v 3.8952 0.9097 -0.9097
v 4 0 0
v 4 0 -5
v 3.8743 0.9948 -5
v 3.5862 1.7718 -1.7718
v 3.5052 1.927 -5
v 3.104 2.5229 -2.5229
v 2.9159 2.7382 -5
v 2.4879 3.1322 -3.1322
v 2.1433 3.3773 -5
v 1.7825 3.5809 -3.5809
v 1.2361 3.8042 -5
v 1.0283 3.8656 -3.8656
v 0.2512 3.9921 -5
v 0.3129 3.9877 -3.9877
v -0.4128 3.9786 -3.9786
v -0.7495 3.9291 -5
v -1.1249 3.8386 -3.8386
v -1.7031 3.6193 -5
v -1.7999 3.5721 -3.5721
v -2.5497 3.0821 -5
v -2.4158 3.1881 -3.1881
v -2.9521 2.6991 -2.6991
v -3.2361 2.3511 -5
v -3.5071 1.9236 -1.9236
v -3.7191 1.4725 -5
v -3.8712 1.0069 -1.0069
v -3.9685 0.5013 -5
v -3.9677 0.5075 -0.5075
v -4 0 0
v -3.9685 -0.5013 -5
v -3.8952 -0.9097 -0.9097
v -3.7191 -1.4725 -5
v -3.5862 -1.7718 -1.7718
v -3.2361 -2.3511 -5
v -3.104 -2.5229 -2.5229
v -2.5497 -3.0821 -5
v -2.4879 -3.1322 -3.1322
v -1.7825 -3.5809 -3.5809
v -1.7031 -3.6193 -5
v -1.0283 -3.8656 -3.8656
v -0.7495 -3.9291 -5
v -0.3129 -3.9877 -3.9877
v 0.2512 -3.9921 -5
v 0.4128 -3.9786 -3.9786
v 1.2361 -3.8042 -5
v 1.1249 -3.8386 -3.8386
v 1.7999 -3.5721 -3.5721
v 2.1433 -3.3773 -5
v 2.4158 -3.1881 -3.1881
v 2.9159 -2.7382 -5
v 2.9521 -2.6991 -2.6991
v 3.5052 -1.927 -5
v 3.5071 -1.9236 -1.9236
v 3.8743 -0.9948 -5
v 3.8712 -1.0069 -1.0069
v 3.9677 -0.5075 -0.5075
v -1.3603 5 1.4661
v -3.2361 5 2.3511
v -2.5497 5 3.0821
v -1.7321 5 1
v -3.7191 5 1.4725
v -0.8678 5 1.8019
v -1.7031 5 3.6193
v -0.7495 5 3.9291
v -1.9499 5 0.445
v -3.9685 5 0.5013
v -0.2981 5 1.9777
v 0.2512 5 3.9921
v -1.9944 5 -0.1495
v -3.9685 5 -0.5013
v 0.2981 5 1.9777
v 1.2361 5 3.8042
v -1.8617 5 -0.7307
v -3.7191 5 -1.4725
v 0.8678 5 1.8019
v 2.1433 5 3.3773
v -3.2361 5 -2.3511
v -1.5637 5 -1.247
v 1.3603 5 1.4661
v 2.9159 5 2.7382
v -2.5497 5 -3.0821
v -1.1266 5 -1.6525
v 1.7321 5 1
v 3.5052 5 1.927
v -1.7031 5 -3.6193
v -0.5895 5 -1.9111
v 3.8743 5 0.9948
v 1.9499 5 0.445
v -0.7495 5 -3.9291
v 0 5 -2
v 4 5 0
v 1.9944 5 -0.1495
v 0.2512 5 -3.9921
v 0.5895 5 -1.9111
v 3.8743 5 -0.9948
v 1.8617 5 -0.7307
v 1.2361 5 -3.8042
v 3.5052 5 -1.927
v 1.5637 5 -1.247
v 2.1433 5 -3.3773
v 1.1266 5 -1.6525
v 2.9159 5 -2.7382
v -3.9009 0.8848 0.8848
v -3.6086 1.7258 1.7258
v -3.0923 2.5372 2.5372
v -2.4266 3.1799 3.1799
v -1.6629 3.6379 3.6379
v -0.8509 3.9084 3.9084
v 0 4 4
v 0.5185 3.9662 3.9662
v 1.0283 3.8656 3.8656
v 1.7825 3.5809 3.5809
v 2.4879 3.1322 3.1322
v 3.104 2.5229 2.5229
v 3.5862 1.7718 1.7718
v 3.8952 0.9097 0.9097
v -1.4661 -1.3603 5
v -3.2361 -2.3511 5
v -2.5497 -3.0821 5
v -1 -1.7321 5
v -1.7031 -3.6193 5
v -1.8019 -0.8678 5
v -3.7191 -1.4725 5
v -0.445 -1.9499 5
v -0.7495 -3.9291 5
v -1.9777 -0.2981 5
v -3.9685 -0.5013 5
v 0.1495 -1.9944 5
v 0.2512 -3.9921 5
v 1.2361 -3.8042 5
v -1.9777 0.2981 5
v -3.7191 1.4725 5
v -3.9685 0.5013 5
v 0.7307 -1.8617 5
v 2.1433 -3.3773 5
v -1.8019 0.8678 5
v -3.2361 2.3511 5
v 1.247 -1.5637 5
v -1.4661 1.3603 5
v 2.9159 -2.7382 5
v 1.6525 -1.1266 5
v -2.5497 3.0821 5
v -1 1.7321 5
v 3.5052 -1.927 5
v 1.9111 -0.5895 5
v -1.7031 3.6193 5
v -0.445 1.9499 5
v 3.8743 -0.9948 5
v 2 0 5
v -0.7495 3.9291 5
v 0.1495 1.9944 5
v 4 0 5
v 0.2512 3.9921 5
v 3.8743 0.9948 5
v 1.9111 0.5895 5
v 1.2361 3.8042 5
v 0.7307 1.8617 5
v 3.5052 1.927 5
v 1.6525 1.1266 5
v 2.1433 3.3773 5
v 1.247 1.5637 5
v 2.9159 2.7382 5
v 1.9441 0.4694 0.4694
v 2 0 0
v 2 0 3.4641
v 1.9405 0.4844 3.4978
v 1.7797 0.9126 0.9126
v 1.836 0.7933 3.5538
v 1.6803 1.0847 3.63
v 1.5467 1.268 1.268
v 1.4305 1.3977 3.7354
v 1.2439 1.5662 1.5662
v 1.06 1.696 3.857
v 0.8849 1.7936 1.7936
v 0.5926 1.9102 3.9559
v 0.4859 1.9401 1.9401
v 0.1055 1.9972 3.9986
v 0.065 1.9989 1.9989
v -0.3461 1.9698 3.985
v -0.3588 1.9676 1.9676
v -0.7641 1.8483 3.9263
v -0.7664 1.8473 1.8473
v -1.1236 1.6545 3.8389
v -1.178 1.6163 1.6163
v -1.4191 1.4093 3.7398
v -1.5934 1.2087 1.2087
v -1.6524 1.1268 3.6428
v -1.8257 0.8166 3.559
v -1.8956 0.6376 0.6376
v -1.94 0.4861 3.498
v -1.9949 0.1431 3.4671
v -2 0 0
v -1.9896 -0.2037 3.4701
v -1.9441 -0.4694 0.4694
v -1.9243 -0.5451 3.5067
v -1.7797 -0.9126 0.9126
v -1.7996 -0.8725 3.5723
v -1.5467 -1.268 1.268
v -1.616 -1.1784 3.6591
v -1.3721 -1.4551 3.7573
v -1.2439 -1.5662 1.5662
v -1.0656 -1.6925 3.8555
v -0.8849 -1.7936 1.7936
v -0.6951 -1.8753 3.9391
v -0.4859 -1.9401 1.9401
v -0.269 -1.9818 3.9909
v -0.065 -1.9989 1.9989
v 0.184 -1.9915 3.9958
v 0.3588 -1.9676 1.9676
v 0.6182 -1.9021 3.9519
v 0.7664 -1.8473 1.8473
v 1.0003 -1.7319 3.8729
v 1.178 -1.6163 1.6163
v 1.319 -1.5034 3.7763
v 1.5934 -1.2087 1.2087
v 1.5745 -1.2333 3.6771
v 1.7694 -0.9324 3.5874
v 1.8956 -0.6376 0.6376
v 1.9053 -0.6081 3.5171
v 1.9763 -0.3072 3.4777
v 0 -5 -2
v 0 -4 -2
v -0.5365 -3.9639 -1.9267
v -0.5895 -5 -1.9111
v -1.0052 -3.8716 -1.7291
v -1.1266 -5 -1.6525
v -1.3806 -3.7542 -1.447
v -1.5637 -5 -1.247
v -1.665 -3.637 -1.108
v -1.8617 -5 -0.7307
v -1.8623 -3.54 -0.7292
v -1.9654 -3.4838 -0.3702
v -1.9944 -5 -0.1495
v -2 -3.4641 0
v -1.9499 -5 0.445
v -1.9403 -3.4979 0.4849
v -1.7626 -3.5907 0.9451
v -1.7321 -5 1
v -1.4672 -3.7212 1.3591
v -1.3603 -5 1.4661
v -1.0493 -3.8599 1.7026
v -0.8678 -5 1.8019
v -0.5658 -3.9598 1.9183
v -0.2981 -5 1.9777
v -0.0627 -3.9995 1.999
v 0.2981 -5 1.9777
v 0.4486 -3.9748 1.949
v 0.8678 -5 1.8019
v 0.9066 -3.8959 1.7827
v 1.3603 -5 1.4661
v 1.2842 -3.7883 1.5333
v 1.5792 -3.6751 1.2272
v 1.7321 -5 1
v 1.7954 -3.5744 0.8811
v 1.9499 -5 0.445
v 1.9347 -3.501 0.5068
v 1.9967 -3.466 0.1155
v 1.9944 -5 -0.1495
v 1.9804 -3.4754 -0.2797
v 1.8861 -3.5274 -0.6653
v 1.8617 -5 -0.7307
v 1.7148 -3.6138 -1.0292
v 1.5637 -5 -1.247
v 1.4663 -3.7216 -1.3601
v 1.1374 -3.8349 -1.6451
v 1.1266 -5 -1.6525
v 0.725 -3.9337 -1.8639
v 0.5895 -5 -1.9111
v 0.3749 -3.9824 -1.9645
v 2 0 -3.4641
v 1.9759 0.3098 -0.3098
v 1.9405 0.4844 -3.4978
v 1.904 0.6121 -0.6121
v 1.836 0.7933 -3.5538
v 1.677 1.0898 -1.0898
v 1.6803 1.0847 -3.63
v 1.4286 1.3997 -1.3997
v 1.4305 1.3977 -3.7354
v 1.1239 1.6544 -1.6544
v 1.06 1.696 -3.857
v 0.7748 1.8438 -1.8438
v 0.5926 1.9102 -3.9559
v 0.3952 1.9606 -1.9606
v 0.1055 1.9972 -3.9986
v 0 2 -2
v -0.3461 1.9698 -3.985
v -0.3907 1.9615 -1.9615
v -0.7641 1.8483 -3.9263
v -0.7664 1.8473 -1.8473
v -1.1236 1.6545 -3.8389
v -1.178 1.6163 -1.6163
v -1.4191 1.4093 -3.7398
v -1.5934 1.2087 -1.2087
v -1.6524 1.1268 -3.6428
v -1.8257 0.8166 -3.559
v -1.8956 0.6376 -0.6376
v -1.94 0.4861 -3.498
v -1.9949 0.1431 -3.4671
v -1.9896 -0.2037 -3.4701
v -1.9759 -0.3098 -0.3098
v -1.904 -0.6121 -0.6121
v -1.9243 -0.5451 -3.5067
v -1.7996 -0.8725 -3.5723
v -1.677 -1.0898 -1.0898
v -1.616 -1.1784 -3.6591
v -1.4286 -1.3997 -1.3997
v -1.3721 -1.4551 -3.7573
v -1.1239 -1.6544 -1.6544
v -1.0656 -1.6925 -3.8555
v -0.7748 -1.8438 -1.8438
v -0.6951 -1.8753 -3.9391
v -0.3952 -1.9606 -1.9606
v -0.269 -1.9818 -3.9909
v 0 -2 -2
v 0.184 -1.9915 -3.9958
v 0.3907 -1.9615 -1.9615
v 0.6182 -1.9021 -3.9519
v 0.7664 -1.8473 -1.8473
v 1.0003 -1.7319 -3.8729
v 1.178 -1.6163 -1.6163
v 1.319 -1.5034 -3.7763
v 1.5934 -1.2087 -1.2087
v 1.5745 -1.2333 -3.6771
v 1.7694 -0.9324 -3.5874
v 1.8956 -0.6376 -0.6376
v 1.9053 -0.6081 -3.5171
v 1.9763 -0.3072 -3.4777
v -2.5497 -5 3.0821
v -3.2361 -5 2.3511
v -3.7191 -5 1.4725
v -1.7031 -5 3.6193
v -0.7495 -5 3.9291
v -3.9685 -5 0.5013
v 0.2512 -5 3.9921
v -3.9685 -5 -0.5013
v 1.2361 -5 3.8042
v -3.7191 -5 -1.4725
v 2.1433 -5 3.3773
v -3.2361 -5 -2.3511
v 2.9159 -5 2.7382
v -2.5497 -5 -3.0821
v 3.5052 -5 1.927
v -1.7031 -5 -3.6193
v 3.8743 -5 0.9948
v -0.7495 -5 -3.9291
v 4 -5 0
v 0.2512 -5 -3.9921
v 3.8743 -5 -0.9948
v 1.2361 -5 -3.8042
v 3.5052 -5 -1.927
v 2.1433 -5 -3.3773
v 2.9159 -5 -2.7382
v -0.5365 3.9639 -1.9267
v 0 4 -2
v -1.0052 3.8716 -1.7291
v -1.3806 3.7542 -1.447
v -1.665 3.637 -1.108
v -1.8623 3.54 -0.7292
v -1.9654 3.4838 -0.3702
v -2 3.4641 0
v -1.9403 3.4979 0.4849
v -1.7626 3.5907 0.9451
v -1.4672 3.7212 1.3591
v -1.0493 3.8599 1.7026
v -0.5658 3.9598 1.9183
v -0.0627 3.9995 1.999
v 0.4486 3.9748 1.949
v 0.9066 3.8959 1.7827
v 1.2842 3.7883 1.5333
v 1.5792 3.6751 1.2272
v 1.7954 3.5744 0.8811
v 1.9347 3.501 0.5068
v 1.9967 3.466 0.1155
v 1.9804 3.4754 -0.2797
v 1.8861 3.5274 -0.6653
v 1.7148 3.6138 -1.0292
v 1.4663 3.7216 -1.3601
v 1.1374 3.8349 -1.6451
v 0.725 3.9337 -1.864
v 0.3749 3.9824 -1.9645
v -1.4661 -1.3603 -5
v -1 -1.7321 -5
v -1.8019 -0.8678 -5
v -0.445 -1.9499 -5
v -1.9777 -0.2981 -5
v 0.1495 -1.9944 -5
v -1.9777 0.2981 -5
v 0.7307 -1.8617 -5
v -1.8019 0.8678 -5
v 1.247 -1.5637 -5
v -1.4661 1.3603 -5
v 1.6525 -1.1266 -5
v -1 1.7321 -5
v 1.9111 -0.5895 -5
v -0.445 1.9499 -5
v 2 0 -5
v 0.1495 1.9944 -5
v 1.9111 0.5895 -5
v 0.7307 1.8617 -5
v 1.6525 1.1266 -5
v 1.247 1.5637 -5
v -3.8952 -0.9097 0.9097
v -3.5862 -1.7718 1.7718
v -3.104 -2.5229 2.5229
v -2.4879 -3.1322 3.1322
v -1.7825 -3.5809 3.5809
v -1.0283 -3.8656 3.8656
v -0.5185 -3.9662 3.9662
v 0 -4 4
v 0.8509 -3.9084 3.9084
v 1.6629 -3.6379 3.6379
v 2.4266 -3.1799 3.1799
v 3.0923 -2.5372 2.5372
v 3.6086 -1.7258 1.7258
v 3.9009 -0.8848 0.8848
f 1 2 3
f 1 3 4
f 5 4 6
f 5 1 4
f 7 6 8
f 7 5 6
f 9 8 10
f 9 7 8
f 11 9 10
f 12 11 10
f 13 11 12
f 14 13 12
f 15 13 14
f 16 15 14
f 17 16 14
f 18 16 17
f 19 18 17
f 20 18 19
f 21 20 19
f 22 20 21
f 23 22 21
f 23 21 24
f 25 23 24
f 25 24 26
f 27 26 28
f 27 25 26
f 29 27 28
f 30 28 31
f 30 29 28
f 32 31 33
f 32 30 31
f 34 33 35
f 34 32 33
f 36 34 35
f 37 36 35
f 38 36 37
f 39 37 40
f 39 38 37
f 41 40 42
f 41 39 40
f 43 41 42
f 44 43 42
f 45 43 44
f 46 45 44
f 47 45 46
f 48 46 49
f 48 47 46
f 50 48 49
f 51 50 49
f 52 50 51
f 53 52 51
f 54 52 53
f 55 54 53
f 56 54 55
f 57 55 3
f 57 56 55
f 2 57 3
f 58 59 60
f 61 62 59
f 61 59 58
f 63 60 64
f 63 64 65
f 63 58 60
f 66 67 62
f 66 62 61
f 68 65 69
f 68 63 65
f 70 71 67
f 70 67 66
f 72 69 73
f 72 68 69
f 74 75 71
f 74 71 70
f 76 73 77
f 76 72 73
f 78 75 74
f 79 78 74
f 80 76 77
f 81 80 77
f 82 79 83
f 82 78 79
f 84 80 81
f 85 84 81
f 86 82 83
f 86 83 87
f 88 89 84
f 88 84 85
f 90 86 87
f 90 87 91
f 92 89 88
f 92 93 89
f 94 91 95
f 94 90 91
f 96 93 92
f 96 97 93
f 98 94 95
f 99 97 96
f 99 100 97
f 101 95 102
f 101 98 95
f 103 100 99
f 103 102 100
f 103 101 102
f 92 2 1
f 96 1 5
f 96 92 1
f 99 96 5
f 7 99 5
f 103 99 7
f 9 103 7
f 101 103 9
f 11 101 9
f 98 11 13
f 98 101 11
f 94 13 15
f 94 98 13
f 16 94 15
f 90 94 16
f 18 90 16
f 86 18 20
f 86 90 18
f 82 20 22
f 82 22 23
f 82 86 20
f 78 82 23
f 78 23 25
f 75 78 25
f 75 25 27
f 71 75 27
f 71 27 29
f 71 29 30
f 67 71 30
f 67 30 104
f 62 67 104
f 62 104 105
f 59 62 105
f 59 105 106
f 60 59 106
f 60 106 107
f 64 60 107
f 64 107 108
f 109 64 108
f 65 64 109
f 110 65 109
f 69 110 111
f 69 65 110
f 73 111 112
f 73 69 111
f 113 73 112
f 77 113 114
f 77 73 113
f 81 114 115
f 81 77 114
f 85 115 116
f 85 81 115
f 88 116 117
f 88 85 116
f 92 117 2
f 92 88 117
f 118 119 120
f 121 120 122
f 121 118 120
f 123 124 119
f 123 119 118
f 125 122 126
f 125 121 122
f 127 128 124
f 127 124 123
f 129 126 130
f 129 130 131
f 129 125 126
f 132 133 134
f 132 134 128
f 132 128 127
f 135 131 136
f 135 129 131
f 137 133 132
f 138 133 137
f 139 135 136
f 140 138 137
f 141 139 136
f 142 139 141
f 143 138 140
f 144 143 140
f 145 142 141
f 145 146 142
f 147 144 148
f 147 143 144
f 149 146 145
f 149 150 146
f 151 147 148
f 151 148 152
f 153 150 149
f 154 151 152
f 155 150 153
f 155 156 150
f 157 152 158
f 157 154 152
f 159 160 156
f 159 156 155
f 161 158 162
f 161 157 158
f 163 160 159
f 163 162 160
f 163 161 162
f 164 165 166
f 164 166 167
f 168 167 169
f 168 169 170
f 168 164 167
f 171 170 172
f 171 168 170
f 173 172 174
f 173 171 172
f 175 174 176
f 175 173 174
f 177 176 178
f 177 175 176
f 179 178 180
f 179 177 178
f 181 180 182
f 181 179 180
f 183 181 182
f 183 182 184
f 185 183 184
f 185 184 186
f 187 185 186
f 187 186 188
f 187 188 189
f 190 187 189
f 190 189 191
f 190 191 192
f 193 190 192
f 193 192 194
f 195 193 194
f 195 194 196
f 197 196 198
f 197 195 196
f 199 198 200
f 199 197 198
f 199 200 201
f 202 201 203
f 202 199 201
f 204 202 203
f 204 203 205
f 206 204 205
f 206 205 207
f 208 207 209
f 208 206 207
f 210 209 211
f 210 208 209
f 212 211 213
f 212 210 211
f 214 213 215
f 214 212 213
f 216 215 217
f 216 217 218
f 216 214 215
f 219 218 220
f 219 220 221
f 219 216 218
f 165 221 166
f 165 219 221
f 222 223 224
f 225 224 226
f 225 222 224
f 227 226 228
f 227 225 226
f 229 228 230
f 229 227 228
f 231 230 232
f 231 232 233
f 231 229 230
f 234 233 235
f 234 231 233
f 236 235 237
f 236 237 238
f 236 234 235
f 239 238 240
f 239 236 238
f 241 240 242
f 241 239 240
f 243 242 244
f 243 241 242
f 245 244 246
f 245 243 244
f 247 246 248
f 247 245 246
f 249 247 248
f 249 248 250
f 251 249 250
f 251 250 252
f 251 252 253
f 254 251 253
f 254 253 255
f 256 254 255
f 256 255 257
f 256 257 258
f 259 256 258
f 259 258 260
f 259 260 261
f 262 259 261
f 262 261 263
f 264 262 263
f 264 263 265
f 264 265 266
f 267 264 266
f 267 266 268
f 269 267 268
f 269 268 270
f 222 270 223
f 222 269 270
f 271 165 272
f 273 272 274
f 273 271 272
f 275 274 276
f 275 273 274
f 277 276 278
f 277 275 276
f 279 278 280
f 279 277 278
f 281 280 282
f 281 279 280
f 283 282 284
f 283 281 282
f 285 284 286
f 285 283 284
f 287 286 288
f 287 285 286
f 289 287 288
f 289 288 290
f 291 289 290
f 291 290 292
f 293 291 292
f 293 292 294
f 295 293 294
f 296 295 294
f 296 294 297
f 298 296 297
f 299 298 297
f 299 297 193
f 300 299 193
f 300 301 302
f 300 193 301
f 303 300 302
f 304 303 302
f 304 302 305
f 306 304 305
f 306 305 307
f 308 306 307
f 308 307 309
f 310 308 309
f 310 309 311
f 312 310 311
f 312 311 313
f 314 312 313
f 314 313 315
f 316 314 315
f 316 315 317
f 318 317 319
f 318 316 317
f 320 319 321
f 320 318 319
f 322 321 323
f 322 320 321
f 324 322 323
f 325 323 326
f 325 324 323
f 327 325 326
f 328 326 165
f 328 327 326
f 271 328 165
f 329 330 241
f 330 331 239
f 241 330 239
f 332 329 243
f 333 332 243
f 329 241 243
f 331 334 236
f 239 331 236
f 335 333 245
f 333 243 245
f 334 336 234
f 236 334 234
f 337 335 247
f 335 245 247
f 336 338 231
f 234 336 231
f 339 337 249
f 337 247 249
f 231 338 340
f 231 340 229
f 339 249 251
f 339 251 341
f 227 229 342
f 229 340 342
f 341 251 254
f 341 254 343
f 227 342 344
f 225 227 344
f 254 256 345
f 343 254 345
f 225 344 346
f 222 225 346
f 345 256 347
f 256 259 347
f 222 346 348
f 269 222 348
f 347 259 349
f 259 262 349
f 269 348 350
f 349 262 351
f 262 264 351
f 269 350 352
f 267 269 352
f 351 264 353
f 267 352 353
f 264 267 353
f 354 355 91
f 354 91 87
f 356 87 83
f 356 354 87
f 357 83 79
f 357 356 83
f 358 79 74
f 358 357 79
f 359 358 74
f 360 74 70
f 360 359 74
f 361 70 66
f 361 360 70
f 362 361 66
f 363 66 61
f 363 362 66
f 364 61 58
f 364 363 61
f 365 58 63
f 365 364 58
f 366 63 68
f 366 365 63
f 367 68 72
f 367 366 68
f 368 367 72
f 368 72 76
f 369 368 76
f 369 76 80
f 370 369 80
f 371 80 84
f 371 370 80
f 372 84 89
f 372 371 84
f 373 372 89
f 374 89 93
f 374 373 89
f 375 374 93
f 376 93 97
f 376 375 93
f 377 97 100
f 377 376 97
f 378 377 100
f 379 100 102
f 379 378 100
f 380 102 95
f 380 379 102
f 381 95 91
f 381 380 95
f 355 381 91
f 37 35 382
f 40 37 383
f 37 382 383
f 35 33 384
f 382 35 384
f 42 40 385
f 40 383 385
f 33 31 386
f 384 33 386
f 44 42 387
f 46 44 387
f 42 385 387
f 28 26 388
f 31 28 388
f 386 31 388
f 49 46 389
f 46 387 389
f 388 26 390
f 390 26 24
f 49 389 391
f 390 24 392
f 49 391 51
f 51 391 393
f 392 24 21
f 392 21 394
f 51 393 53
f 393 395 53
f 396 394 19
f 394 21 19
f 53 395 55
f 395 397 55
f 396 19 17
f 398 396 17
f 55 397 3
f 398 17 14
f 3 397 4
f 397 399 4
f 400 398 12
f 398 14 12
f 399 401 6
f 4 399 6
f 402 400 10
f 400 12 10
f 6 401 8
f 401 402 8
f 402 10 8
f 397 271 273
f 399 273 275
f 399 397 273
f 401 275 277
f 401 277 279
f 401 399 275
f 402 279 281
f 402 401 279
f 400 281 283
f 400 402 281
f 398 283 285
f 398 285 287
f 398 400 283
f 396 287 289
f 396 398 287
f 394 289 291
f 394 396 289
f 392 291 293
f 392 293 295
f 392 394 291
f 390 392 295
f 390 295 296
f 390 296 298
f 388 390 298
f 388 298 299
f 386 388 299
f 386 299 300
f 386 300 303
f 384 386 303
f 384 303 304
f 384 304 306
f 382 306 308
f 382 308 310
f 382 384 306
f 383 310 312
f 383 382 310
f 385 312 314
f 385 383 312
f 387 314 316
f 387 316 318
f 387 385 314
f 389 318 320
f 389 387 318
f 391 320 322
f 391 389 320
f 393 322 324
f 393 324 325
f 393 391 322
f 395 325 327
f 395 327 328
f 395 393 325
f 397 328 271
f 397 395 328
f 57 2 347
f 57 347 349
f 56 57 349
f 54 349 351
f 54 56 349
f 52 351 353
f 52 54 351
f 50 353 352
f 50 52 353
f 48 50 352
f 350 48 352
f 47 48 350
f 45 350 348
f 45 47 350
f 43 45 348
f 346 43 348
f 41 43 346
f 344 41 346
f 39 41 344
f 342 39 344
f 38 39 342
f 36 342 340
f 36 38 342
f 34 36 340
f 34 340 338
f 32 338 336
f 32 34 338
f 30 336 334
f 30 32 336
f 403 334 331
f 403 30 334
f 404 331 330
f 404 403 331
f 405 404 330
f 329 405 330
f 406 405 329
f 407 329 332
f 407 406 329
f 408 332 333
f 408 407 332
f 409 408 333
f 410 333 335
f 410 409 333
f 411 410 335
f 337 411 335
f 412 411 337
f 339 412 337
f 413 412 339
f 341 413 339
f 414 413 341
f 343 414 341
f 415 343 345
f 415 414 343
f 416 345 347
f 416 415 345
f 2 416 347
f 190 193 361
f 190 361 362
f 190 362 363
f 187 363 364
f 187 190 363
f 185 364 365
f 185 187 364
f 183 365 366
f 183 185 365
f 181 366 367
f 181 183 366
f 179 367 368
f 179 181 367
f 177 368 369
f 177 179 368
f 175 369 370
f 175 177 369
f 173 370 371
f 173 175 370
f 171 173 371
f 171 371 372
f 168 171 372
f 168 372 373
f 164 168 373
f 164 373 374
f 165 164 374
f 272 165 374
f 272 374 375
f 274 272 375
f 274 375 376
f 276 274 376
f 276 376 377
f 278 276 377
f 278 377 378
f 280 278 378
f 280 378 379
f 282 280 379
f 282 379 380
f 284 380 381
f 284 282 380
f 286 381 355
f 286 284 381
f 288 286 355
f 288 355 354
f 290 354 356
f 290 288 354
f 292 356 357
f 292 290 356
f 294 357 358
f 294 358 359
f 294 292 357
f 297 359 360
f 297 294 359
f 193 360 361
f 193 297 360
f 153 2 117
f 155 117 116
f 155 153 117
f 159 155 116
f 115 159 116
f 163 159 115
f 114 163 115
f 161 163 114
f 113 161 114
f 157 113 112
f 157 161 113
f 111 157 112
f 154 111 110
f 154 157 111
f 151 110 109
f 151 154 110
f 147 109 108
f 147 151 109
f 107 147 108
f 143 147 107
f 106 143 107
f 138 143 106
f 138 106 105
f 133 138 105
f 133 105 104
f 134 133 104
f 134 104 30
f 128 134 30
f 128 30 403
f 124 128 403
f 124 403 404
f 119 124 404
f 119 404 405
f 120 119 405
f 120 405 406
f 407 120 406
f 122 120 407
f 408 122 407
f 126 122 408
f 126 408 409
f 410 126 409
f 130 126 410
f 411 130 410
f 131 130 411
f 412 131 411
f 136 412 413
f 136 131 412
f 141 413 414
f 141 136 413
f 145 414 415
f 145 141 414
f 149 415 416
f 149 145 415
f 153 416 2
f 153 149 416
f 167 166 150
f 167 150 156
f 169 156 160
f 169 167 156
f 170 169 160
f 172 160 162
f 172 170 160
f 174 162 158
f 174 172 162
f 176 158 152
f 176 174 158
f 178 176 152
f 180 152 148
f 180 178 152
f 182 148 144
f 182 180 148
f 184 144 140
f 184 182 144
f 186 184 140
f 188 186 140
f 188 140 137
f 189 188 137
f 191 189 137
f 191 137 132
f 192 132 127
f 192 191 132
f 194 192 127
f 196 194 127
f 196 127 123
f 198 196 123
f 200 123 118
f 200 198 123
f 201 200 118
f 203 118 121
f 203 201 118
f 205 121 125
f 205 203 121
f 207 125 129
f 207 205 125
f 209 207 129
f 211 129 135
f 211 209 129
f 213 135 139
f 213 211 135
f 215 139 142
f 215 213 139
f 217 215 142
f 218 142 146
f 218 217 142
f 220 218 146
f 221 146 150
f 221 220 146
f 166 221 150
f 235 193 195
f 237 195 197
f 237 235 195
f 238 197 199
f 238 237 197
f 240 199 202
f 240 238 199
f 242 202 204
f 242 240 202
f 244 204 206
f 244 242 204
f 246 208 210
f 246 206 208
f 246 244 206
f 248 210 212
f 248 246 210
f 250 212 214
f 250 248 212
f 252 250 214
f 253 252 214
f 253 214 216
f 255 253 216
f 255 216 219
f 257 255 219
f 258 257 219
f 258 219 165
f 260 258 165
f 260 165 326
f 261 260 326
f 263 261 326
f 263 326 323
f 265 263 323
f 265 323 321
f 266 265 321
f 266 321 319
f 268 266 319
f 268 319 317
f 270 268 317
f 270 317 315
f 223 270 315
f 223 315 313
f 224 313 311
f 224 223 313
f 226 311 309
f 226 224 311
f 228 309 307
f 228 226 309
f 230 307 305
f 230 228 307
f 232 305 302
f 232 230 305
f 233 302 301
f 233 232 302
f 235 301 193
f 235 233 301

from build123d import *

# Parameters (mm, degrees)
SKETCH1_R               = 4
SKETCH1_R_2             = 2
BOSS_EXTRUDE1_DEPTH     = 5
SKETCH2_R               = 4
SKETCH2_R_2             = 2
BOSS_EXTRUDE2_DEPTH     = 5
CUT_EXTRUDE1_DEPTH      = 9.124038528
CUT_EXTRUDE1_DEPTH_BACK = 9.124038528
SKETCH1_2_R             = 2
CUT_EXTRUDE2_DEPTH      = 9.124038528
CUT_EXTRUDE2_DEPTH_BACK = 9.124038528
SKETCH2_2_R             = 2


with BuildPart() as part:
    # Sketch1 → Boss-Extrude1 (new, symmetric)
    with BuildSketch(Plane.XY):
        Circle(SKETCH1_R)
        Circle(SKETCH1_R_2, mode=Mode.SUBTRACT)
    extrude(amount=BOSS_EXTRUDE1_DEPTH, both=True)

    # Sketch2 → Boss-Extrude2 (add, symmetric)
    with BuildSketch(Plane(origin=(0, 0, 0), x_dir=(1, 0, 0), z_dir=(0, 1, 0))):
        Circle(SKETCH2_R)
        Circle(SKETCH2_R_2, mode=Mode.SUBTRACT)
    extrude(amount=BOSS_EXTRUDE2_DEPTH, both=True)

    # Sketch1<2> → Cut-Extrude1 (cut, two sides: drawn at the far end of the back side and taken through both)
    with BuildSketch(Plane.XY.offset(-CUT_EXTRUDE1_DEPTH_BACK)):
        Circle(SKETCH1_2_R)
    extrude(amount=CUT_EXTRUDE1_DEPTH + CUT_EXTRUDE1_DEPTH_BACK, mode=Mode.SUBTRACT)

    # Sketch2<2> → Cut-Extrude2 (cut, two sides: drawn at the far end of the back side and taken through both)
    with BuildSketch(Plane(origin=(0, 0, 0), x_dir=(1, 0, 0), z_dir=(0, 1, 0)).offset(-CUT_EXTRUDE2_DEPTH_BACK)):
        Circle(SKETCH2_2_R)
    extrude(amount=CUT_EXTRUDE2_DEPTH + CUT_EXTRUDE2_DEPTH_BACK, mode=Mode.SUBTRACT)


solid = part.part
